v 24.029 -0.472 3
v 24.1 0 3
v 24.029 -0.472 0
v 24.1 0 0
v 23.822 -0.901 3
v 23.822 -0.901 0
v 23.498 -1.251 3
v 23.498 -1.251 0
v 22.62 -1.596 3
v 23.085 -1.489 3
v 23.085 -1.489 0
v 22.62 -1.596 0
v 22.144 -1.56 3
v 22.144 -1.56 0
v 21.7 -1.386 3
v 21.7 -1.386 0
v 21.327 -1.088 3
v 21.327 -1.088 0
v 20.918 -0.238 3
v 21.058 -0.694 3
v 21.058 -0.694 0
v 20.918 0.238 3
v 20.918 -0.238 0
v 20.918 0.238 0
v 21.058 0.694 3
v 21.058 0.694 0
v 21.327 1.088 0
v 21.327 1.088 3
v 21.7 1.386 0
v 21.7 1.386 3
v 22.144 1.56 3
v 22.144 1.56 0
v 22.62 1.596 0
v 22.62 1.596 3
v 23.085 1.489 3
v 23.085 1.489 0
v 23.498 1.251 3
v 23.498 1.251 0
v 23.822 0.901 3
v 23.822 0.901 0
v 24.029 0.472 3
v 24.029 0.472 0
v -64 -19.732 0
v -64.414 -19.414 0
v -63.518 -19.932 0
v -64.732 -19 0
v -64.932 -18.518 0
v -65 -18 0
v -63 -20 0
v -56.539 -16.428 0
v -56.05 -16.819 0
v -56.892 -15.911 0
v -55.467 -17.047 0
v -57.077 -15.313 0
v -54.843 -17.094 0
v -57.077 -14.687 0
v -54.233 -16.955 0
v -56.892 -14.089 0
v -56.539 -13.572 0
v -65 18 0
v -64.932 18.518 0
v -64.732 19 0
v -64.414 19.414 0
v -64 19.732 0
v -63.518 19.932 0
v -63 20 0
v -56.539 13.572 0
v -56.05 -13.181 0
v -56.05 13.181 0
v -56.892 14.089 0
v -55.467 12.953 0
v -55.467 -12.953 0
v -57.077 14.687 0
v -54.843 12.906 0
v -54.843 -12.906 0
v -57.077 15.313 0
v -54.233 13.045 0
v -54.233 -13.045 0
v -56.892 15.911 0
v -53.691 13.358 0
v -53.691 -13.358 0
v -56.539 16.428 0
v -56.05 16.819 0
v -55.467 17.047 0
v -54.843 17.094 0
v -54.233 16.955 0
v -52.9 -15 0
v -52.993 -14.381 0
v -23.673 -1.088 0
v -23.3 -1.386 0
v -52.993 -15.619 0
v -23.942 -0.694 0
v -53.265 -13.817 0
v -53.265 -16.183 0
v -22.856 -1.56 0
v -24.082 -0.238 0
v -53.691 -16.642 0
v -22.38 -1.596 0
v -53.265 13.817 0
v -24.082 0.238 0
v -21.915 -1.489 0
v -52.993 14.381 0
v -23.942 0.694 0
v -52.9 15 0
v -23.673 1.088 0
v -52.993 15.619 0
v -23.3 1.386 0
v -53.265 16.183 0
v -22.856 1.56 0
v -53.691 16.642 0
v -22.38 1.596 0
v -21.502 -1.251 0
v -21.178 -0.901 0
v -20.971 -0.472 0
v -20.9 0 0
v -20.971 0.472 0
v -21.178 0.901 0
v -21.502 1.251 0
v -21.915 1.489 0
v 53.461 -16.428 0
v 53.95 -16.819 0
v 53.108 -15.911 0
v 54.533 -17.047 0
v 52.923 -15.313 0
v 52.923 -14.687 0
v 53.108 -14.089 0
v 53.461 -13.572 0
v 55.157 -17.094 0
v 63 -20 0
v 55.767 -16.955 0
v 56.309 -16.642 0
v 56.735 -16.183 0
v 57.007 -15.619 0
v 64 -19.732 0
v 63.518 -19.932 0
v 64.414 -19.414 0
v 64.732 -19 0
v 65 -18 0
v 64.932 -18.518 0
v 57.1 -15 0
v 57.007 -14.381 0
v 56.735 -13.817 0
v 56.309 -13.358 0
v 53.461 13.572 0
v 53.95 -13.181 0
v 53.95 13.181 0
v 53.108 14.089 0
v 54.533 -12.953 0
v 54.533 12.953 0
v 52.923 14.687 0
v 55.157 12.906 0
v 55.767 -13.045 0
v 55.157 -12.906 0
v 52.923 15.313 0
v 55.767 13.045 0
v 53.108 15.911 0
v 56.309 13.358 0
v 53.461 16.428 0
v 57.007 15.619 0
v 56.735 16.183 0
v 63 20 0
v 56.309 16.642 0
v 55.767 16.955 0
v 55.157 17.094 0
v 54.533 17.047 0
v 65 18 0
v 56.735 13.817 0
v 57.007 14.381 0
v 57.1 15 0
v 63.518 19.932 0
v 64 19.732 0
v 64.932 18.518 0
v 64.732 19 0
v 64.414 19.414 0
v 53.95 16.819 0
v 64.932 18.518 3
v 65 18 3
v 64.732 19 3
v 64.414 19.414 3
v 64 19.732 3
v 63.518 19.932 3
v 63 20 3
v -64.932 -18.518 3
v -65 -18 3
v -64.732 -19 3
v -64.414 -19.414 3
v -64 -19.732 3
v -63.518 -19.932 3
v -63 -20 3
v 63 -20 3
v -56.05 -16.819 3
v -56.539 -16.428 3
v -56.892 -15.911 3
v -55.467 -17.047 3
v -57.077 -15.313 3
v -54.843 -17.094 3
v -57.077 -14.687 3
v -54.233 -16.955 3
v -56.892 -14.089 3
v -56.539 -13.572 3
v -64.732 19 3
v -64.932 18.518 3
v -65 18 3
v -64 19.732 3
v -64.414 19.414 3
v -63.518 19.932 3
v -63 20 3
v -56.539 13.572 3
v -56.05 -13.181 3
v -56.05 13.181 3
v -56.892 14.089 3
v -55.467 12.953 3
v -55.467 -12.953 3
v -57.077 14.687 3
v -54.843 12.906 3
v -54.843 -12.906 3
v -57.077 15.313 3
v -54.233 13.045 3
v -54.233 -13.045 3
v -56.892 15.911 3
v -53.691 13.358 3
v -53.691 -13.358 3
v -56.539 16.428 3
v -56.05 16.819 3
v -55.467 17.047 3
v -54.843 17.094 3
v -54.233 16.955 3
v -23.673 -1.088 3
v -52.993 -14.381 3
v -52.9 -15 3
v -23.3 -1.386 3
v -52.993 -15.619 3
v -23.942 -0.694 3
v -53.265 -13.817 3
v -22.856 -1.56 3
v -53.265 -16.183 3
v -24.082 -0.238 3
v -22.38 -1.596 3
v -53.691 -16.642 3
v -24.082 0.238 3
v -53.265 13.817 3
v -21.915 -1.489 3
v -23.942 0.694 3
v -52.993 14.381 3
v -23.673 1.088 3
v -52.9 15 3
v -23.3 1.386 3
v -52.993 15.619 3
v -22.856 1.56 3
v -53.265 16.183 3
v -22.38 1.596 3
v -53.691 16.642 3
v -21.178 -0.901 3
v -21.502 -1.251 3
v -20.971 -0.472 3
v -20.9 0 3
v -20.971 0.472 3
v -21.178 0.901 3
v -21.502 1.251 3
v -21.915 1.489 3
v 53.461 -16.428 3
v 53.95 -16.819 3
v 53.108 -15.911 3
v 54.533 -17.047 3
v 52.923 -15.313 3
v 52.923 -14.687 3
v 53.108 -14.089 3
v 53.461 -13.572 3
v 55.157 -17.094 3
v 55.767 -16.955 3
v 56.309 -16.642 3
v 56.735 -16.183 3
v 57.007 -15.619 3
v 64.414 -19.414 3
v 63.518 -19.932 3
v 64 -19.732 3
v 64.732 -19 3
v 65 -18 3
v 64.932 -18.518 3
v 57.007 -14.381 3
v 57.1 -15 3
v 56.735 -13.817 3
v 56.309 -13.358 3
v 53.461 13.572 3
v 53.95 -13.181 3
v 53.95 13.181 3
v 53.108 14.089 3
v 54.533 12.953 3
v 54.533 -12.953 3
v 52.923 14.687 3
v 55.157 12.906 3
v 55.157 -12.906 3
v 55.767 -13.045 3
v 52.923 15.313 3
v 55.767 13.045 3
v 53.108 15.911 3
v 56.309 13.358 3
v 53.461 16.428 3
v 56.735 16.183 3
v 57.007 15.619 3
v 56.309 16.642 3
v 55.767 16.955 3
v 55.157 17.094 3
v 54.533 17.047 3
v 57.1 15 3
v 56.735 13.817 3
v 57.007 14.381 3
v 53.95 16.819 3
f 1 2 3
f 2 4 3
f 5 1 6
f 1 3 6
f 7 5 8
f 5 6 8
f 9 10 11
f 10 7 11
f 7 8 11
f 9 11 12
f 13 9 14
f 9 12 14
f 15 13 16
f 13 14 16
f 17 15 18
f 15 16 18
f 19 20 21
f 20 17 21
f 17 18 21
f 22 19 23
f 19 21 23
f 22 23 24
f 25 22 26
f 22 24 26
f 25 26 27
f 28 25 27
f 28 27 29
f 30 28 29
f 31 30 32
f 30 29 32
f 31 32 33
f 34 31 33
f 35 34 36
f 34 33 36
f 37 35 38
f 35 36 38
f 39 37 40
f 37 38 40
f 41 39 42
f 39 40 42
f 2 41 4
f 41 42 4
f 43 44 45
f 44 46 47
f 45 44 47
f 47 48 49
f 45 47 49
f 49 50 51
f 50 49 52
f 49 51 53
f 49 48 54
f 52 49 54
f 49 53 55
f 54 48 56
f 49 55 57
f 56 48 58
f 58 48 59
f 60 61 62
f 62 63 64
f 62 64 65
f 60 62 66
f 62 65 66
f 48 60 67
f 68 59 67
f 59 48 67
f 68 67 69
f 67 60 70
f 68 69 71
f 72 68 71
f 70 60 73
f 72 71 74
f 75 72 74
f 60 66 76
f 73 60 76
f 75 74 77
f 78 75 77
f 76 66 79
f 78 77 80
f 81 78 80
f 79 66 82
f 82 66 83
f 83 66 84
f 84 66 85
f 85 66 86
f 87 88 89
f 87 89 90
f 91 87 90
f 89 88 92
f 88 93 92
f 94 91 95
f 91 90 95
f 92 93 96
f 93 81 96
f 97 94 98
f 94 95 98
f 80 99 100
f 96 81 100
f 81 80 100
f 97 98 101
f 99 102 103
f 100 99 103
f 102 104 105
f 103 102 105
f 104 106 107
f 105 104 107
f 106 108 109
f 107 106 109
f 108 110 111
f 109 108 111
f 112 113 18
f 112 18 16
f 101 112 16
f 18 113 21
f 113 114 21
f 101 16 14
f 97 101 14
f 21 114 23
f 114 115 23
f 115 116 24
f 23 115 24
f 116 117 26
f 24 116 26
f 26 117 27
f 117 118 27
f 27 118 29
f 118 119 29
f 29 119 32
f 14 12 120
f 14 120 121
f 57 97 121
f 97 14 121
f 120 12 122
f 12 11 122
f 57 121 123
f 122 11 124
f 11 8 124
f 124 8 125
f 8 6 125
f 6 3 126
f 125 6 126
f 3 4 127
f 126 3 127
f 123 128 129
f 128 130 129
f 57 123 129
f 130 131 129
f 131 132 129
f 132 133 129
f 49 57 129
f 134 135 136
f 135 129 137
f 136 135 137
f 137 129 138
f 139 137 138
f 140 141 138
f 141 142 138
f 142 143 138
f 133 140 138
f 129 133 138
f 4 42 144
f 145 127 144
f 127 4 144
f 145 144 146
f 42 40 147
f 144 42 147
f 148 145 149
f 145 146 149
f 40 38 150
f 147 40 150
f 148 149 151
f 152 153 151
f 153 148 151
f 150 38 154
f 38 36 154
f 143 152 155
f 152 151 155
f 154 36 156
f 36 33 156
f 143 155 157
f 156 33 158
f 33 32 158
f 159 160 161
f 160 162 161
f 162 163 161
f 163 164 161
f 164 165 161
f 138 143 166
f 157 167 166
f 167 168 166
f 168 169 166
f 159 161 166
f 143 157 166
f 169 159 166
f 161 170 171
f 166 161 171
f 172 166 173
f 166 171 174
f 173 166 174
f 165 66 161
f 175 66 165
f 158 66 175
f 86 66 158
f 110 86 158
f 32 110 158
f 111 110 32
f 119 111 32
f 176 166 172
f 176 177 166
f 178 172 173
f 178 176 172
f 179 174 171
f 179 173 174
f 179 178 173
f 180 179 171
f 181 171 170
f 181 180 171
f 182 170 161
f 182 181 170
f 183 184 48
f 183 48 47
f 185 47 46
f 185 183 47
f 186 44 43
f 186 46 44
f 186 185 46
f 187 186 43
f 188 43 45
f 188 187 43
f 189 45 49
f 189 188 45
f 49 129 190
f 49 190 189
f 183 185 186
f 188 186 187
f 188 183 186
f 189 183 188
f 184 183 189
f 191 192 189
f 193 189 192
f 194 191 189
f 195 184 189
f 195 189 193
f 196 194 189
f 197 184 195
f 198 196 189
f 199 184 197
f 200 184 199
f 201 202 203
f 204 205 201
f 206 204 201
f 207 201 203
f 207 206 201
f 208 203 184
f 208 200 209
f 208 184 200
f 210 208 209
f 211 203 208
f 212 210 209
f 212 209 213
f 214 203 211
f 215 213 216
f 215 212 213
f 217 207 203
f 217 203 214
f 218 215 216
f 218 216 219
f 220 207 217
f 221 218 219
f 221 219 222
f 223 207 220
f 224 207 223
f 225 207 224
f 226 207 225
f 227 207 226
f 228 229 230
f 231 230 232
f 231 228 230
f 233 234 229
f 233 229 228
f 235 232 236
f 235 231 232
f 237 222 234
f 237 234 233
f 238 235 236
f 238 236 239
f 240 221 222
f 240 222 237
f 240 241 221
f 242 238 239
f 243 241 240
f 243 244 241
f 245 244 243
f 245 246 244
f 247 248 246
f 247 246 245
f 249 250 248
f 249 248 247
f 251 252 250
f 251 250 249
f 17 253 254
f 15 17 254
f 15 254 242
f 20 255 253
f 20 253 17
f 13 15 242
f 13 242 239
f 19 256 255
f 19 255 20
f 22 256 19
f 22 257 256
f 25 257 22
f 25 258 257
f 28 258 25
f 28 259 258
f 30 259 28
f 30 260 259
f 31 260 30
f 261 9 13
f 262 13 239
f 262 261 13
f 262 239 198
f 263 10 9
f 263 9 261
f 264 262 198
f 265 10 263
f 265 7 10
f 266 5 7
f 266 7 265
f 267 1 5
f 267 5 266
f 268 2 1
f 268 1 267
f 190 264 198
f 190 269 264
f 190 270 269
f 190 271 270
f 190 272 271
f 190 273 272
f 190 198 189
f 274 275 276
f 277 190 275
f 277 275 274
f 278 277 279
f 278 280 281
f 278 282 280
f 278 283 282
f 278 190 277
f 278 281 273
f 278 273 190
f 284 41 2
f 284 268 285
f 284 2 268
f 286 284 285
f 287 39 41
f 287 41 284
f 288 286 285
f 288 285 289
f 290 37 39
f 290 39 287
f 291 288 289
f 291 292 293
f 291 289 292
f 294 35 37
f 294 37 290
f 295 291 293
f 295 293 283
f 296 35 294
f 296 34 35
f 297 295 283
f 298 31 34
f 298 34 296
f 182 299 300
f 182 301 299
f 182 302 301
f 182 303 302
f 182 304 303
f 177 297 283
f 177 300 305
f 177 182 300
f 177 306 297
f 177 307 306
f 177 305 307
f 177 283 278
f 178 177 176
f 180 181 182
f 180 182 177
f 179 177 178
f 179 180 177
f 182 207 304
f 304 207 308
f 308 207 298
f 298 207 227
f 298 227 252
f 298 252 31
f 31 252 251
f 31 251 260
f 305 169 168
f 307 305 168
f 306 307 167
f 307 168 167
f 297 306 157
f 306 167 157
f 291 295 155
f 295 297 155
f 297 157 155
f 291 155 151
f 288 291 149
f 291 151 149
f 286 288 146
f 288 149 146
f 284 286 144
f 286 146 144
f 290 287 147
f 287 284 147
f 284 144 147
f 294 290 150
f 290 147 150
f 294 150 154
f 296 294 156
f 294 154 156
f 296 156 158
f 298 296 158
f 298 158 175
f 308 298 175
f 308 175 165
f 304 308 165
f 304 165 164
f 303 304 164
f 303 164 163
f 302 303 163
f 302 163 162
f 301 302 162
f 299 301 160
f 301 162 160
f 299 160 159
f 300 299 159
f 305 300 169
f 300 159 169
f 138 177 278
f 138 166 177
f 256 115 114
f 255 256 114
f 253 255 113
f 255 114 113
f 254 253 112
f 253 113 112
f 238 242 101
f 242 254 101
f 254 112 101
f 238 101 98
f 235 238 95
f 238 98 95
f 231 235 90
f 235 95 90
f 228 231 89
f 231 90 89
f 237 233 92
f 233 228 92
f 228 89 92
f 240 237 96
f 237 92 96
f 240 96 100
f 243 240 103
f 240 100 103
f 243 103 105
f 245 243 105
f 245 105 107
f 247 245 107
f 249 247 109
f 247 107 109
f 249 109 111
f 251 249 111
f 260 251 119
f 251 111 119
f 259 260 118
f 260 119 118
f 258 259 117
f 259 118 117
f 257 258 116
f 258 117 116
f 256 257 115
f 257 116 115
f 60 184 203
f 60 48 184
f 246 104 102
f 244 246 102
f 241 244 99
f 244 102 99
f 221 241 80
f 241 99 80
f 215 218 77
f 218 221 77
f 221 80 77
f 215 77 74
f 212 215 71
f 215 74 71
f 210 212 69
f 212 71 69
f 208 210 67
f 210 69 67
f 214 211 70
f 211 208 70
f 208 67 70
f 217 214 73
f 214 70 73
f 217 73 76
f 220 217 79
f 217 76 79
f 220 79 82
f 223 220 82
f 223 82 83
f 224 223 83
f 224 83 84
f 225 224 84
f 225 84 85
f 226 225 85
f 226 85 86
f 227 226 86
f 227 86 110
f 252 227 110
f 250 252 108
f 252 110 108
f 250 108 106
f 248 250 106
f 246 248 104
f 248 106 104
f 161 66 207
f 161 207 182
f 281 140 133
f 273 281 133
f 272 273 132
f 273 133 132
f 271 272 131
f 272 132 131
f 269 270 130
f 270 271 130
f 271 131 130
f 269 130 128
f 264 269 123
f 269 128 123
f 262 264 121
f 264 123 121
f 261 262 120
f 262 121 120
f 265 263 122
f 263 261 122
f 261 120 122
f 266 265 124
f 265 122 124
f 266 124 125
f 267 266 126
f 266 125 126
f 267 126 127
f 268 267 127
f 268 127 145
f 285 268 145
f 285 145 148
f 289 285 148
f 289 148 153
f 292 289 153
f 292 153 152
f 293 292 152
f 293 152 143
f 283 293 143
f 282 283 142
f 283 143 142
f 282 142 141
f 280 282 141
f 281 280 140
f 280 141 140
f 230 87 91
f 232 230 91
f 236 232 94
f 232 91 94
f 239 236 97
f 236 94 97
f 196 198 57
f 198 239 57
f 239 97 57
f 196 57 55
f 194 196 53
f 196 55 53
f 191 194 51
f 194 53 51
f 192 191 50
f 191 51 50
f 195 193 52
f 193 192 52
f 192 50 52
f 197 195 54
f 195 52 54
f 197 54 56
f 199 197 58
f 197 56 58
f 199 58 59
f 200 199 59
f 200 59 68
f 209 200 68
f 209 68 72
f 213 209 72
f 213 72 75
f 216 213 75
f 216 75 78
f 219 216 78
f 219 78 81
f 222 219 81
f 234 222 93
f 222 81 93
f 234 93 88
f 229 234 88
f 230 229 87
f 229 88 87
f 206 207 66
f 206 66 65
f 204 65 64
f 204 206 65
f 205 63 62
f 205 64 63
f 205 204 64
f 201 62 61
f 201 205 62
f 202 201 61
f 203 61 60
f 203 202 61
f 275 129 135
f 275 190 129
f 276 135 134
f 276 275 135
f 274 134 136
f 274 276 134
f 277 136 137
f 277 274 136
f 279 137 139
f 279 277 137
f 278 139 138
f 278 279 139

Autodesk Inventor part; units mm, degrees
ref_plane "YZ Plane" through (0, 0, 0) normal (1, 0, 0) x (0, 1, 0)
ref_plane "XZ Plane" through (0, 0, 0) normal (0, 1, 0) x (-1, 0, 0)
ref_plane "XY Plane" through (0, 0, 0) normal (0, 0, 1) x (1, 0, 0)
sketch "スケッチ1" plane through (0, 0, 0) normal (0, 0, 1) x (1, 0, 0)
  line L0 (65, -20) -> (-65, -20)
  line L1 (-65, -20) -> (-65, 20)
  line L2 (-65, 20) -> (65, 20)
  line L3 (65, 20) -> (65, -20)
  line L4 (65, -20) -> (-65, 20) construction
  line L5 (-65, -20) -> (65, 20) construction
  circle A0 centre (-55, 15) radius 2.1
  circle A1 centre (-55, -15) radius 2.1
  circle A2 centre (55, 15) radius 2.1
  circle A3 centre (55, -15) radius 2.1
  circle A4 centre (22.5, 0) radius 1.6
  circle A5 centre (-22.5, 0) radius 1.6
  point P0 (0, 0)
  point P1 (0, 0)
  dimension "d0" = 130
  dimension "d1" = 40
  dimension "d2" = 4.2
  dimension "d3" = 4.2
  dimension "d4" = 4.2
  dimension "d5" = 4.2
  dimension "d6" = 3.2
  dimension "d7" = 3.2
  dimension "d8" = 22.5
  dimension "d9" = 22.5
  dimension "d10" = 10
  dimension "d11" = 10
  dimension "d12" = 5
  dimension "d13" = 5
  dimension "d14" = 10
  dimension "d15" = 5
  dimension "d16" = 10
  dimension "d17" = 5
extrude "押し出し1" add sketch "スケッチ1" along normal blind 3
fillet "フィレット1" radius 2 4 edges at (65, 20, 1.5) (65, -20, 1.5) (-65, 20, 1.5) (-65, -20, 1.5)
properties part number "RPlate"
